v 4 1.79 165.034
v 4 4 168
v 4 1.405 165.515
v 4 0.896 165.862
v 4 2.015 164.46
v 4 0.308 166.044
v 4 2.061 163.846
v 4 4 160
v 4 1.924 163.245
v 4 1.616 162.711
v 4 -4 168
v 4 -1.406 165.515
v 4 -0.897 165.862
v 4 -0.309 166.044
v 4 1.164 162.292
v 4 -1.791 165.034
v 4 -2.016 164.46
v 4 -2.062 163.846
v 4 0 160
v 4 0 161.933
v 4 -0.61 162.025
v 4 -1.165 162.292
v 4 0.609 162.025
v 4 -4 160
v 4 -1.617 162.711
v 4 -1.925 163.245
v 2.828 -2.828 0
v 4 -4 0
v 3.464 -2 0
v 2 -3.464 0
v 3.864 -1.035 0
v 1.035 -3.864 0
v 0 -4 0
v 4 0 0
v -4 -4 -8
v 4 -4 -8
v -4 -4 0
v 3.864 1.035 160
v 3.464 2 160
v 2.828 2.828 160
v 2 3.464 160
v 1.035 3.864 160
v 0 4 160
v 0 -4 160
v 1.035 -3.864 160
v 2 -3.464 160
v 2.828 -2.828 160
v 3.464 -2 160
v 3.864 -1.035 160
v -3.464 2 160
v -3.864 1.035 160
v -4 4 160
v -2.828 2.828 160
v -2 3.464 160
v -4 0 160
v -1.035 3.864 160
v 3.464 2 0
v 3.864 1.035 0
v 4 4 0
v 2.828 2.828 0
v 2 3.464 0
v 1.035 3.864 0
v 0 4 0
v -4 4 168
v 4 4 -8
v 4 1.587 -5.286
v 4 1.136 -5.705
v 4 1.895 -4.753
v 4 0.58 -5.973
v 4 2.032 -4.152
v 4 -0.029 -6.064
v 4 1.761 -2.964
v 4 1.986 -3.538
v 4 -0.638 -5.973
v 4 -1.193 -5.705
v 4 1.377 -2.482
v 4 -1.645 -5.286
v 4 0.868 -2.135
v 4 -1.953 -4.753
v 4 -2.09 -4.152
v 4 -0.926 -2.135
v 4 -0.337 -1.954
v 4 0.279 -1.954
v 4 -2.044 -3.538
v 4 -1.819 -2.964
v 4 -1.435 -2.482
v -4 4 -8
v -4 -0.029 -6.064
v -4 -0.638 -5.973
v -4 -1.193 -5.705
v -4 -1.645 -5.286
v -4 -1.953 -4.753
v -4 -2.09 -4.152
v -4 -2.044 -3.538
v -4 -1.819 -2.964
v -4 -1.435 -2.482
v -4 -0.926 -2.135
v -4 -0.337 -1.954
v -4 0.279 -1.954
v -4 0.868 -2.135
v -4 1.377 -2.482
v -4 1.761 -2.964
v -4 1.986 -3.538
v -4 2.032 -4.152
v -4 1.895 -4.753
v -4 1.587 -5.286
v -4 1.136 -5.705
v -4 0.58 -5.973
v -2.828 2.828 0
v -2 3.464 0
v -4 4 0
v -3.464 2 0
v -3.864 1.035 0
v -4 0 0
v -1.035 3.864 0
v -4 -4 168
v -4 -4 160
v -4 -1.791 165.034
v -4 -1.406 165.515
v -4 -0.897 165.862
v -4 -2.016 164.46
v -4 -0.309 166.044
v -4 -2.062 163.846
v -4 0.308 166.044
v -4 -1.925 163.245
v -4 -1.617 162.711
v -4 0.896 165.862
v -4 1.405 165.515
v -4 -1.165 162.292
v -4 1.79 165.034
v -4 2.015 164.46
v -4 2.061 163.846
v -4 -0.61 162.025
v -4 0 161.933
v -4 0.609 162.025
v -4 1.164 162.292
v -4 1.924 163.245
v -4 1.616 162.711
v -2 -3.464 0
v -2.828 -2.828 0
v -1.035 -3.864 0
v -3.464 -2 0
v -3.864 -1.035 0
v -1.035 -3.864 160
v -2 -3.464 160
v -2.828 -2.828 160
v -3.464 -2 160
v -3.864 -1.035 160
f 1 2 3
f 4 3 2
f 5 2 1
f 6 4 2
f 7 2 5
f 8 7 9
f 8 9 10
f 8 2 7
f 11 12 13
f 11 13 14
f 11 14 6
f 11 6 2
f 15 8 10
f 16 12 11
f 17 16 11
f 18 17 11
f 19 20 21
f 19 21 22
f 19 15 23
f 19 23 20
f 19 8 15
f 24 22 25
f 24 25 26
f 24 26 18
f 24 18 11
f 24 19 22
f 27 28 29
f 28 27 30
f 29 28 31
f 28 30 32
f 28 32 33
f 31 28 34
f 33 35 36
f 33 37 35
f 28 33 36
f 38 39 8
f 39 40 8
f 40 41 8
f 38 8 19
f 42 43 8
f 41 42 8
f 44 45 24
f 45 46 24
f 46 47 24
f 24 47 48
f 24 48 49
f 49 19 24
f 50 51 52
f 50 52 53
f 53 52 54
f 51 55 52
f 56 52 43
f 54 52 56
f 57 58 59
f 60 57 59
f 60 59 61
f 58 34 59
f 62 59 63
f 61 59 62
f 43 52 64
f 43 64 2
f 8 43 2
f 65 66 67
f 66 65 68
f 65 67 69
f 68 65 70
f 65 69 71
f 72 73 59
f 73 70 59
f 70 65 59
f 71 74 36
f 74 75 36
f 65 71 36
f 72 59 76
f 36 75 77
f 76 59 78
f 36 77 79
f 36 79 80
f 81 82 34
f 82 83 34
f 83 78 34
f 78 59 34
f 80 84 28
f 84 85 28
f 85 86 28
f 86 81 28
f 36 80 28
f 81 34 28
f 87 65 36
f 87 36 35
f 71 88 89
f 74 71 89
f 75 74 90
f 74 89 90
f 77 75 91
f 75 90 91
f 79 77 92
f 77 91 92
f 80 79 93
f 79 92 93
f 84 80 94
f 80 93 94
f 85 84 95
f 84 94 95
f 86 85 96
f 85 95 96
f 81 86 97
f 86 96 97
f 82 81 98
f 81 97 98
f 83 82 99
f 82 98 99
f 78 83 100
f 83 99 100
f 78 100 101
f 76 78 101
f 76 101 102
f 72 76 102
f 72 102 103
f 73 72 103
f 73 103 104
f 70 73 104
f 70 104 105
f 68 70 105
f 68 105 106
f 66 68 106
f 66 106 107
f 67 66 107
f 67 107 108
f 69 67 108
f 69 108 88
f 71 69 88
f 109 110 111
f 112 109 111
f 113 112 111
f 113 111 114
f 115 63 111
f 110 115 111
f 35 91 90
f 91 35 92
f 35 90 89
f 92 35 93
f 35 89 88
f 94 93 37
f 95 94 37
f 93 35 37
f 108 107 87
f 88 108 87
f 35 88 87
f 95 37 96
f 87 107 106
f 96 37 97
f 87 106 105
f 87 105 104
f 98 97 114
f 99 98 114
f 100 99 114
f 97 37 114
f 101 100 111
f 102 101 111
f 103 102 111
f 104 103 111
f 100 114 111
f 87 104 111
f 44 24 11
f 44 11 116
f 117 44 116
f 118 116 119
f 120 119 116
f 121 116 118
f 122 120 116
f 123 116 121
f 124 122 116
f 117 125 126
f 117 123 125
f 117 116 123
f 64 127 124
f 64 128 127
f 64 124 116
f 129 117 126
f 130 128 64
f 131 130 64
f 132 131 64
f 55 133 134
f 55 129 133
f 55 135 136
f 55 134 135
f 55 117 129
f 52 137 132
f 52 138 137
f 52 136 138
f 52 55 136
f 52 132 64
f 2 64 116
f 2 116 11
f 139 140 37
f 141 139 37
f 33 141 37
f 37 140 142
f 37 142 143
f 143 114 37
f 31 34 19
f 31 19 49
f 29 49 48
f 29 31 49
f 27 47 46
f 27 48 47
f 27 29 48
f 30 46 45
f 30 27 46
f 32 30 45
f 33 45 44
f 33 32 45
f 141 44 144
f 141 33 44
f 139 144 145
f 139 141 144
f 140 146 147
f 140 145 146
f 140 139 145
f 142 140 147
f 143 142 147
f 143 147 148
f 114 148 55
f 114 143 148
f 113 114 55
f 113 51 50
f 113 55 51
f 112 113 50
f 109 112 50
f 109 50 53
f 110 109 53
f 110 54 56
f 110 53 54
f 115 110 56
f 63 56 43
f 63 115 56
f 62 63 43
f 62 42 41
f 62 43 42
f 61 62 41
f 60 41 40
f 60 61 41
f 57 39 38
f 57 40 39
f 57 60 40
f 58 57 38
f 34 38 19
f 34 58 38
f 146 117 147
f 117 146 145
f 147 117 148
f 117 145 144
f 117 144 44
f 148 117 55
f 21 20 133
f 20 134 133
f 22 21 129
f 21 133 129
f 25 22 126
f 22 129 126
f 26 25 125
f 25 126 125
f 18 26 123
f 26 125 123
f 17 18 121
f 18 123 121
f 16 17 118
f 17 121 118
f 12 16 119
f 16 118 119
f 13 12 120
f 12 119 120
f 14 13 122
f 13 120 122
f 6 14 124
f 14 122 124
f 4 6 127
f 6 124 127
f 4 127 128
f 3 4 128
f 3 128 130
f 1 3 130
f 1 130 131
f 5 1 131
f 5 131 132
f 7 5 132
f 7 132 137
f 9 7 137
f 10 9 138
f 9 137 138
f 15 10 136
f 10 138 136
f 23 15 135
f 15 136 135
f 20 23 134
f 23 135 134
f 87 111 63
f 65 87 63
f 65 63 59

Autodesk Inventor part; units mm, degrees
ref_plane "YZ Plane" through (0, 0, 0) normal (1, 0, 0) x (0, 1, 0)
ref_plane "XZ Plane" through (0, 0, 0) normal (0, 1, 0) x (-1, 0, 0)
ref_plane "XY Plane" through (0, 0, 0) normal (0, 0, 1) x (1, 0, 0)
sketch "Szkic1" plane through (0, 0, 0) normal (0, 0, 1) x (1, 0, 0)
  circle A0 centre (0, 0) radius 4
  dimension "d0" = 8
extrude "Wyciągnięcie proste1" add sketch "Szkic1" along normal blind 160
sketch "Szkic2" plane through (0, 0, 160) normal (0, 0, 1) x (1, 0, 0)
  line L0 (4, -4) -> (-4, -4)
  line L1 (-4, -4) -> (-4, 4)
  line L2 (-4, 4) -> (4, 4)
  line L3 (4, 4) -> (4, -4)
  line L4 (4, -4) -> (-4, 4) construction
  line L5 (-4, -4) -> (4, 4) construction
  point P0 (0, 0)
  dimension "d3" = 8
  dimension "d4" = 8
extrude "Wyciągnięcie proste2" add sketch "Szkic2" along normal blind 8
sketch "Szkic3" plane through (0, 0, 0) normal (0, 0, -1) x (-1, 0, 0)
  line L0 (4, -4) -> (-4, -4) projected
  line L1 (4, 4) -> (-4, 4)
  line L2 (-4, 4) -> (-4, -4)
  line L3 (-4, -4) -> (4, -4)
  line L4 (4, -4) -> (4, 4)
  line L5 (4, 4) -> (-4, -4) construction
  line L6 (-4, 4) -> (4, -4) construction
  point P0 (0, 0)
extrude "Wyciągnięcie proste3" add sketch "Szkic3" along normal blind 8
sketch "Szkic4" plane through (4, 0, 0) normal (1, 0, 0) x (0, 0, -1)
  line L0 (0, -4) -> (8, -4) construction
  line L1 (8, -4) -> (0, 3.9612) construction
  line L2 (0, 0) -> (0, -4) construction
  line L3 (8, -4) -> (8, 4) construction
  line L4 (0, -4) -> (8, 4) construction
  line L5 (-160, 0) -> (-160, -4) construction
  line L6 (-168, 4) -> (-168, -4) construction
  line L7 (-160, -4) -> (-168, 4) construction
  line L8 (-168, 4) -> (-168, -4) construction
  line L9 (-168, -4) -> (-160, 4) construction
sketch "Szkic5" plane through (4, 0, 0) normal (1, 0, 0) x (0, 0, -1)
  point P0 (0, 0)
  point P1 (3.9975, -0.0288)
hole "Otwór1" at (4, -0.0288, -3.9975) direction (-1, 0, 0) diameter 4.134 end through all thread size "M5x0.8" class "6H" standard "ANSI Metric M Profile"
sketch "Szkic6" plane through (4, -4, 160) normal (1, 0, 0) x (0, 0, -1)
  point P0 (160, 4)
  point P1 (-4, 3.9995)
hole "Otwór2" at (4, -0.0005, 164) direction (-1, 0, 0) diameter 4.134 end through all thread size "M5x0.8" class "6H" standard "ANSI Metric M Profile"
properties part number "wal_sr_tyl"
